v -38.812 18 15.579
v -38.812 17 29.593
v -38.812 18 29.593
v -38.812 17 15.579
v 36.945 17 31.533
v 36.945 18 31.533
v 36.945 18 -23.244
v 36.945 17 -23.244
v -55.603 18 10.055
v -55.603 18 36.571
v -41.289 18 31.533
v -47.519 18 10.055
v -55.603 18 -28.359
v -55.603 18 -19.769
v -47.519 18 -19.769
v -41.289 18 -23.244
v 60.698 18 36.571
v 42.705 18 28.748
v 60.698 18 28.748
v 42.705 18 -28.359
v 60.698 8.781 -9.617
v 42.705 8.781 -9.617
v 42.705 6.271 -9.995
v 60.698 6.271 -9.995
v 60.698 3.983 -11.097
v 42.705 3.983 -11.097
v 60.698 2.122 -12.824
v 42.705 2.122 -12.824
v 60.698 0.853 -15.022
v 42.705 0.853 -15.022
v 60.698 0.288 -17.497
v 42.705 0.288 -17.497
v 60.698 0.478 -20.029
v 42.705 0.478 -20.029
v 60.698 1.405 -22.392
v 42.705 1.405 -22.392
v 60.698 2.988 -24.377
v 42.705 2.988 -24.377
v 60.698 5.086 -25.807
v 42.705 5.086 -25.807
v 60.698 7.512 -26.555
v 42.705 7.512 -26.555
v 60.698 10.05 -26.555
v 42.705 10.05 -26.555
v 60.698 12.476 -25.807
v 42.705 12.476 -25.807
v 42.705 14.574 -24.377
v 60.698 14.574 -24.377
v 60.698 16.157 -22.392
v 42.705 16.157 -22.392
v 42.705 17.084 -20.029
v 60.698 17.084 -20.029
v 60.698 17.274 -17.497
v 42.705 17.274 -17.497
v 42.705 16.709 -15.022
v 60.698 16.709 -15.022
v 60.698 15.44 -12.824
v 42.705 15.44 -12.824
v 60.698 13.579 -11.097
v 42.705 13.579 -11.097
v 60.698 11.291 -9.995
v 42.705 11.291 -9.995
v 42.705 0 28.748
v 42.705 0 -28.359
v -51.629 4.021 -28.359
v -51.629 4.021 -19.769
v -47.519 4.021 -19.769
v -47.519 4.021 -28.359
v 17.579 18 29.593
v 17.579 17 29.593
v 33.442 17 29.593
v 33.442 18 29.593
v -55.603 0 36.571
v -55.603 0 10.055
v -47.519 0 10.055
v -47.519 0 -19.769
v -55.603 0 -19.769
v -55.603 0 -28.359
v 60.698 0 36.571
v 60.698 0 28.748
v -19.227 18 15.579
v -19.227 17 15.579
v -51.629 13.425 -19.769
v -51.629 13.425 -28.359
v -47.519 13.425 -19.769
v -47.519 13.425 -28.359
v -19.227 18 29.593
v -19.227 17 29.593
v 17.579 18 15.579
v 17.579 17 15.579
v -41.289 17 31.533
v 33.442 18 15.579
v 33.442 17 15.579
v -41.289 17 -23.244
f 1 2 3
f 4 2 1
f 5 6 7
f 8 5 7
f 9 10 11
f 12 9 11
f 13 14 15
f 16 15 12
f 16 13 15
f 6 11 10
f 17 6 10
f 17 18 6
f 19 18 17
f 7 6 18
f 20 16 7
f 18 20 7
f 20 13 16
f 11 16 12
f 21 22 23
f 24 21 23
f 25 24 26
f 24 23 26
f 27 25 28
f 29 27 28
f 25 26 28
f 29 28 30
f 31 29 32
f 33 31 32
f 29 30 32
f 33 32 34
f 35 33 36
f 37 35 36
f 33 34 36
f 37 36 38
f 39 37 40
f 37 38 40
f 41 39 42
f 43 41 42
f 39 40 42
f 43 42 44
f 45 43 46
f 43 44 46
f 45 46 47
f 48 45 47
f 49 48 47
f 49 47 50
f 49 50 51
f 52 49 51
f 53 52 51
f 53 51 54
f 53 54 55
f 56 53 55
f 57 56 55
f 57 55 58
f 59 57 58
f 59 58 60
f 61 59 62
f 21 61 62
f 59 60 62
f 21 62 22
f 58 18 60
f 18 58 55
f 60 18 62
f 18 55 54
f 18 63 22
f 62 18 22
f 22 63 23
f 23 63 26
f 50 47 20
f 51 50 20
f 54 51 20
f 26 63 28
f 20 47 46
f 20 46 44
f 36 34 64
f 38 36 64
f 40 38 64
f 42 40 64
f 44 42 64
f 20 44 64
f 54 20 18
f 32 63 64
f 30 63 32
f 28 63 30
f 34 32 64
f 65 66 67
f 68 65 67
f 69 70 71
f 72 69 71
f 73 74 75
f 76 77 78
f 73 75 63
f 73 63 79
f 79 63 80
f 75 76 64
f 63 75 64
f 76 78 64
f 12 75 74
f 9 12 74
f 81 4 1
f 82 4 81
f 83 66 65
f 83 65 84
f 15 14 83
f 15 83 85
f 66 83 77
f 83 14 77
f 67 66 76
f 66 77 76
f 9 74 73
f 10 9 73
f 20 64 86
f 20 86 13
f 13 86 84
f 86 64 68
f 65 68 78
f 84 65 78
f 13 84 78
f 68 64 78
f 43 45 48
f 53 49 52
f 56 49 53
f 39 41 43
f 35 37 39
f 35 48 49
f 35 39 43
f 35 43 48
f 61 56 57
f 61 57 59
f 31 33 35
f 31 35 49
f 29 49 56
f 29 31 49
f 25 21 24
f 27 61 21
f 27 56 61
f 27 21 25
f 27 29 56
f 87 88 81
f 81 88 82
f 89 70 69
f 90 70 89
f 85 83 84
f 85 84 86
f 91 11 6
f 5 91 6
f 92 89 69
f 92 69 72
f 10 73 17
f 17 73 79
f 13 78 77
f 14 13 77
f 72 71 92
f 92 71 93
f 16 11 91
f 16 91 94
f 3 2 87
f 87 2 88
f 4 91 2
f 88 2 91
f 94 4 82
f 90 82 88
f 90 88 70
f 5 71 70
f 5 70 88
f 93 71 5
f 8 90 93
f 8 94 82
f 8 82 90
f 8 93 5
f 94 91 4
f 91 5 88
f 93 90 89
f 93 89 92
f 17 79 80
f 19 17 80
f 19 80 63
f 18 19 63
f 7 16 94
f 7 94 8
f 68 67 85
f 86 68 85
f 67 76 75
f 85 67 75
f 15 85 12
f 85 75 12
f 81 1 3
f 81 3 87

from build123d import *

# Parameters (mm, degrees)
BOSS_EXTRUDE1_DEPTH = 18
SKETCH2_R           = 8.516680521
BOSS_EXTRUDE2_DEPTH = 17.99267
SKETCH3_W           = 78.234373806
SKETCH3_H           = 54.777100321
CUT_EXTRUDE1_DEPTH  = 1
SKETCH4_W           = 15.862685655
SKETCH4_H           = 14.014084995
SKETCH4_W_2         = 19.585195724
BOSS_EXTRUDE3_DEPTH = 1
SKETCH5_W           = 4.110560002
SKETCH5_H           = 9.404487674
CUT_EXTRUDE2_DEPTH  = 9.590155657


with BuildPart() as part:
    # Sketch1 → Boss-Extrude1 (new body)
    with BuildSketch(Plane(origin=(0, 0, 0), x_dir=(1, 0, 0), z_dir=(0, 1, 0))):
        Polygon((-55.602513221, 28.358711105), (-55.602513221, 19.768555449), (-47.518849821, 19.768555449), (-47.518849821, -10.055277405), (-55.602513221, -10.055277405), (-55.602513221, -36.571359429), (60.697934404, -36.571359429), (60.697934404, -28.748459365), (42.705264255, -28.748459365), (42.705264255, 13.755964318), (42.705264255, 28.358711105), align=None)
    extrude(amount=BOSS_EXTRUDE1_DEPTH)

    # Sketch2 → Boss-Extrude2 (add)
    with BuildSketch(Plane(origin=(42.705264255, 0, 0), x_dir=(0, 0, -1), z_dir=(1, 0, 0))):
        with Locations(Location((18.133704787, 8.780998405, 0), (0, 0, 180))):  # turned: the seam where the file's is
            Circle(SKETCH2_R)
    extrude(amount=BOSS_EXTRUDE2_DEPTH)

    # Sketch3 → Cut-Extrude1 (cut)
    with BuildSketch(Plane(origin=(0, 18, 0), x_dir=(1, 0, 0), z_dir=(0, 1, 0))):
        with Locations((-2.172142095, -4.144542808)):
            Rectangle(SKETCH3_W, SKETCH3_H)
    extrude(amount=-CUT_EXTRUDE1_DEPTH, mode=Mode.SUBTRACT)

    # Sketch4 → Boss-Extrude3 (add)
    with BuildSketch(Plane(origin=(0, 17, 0), x_dir=(1, 0, 0), z_dir=(0, 1, 0))):
        with Locations((25.510271921, -22.585660372)):
            Rectangle(SKETCH4_W, SKETCH4_H)
        with Locations((-29.019306935, -22.585660372)):
            Rectangle(SKETCH4_W_2, SKETCH4_H)
    extrude(amount=BOSS_EXTRUDE3_DEPTH)

    # Sketch5 → Cut-Extrude2 (cut, through all)
    with BuildSketch(Plane.XY.offset(-19.768555449)):
        with Locations((-49.574129822, 8.723143931)):
            Rectangle(SKETCH5_W, SKETCH5_H)
    extrude(amount=-CUT_EXTRUDE2_DEPTH, mode=Mode.SUBTRACT)


solid = part.part
